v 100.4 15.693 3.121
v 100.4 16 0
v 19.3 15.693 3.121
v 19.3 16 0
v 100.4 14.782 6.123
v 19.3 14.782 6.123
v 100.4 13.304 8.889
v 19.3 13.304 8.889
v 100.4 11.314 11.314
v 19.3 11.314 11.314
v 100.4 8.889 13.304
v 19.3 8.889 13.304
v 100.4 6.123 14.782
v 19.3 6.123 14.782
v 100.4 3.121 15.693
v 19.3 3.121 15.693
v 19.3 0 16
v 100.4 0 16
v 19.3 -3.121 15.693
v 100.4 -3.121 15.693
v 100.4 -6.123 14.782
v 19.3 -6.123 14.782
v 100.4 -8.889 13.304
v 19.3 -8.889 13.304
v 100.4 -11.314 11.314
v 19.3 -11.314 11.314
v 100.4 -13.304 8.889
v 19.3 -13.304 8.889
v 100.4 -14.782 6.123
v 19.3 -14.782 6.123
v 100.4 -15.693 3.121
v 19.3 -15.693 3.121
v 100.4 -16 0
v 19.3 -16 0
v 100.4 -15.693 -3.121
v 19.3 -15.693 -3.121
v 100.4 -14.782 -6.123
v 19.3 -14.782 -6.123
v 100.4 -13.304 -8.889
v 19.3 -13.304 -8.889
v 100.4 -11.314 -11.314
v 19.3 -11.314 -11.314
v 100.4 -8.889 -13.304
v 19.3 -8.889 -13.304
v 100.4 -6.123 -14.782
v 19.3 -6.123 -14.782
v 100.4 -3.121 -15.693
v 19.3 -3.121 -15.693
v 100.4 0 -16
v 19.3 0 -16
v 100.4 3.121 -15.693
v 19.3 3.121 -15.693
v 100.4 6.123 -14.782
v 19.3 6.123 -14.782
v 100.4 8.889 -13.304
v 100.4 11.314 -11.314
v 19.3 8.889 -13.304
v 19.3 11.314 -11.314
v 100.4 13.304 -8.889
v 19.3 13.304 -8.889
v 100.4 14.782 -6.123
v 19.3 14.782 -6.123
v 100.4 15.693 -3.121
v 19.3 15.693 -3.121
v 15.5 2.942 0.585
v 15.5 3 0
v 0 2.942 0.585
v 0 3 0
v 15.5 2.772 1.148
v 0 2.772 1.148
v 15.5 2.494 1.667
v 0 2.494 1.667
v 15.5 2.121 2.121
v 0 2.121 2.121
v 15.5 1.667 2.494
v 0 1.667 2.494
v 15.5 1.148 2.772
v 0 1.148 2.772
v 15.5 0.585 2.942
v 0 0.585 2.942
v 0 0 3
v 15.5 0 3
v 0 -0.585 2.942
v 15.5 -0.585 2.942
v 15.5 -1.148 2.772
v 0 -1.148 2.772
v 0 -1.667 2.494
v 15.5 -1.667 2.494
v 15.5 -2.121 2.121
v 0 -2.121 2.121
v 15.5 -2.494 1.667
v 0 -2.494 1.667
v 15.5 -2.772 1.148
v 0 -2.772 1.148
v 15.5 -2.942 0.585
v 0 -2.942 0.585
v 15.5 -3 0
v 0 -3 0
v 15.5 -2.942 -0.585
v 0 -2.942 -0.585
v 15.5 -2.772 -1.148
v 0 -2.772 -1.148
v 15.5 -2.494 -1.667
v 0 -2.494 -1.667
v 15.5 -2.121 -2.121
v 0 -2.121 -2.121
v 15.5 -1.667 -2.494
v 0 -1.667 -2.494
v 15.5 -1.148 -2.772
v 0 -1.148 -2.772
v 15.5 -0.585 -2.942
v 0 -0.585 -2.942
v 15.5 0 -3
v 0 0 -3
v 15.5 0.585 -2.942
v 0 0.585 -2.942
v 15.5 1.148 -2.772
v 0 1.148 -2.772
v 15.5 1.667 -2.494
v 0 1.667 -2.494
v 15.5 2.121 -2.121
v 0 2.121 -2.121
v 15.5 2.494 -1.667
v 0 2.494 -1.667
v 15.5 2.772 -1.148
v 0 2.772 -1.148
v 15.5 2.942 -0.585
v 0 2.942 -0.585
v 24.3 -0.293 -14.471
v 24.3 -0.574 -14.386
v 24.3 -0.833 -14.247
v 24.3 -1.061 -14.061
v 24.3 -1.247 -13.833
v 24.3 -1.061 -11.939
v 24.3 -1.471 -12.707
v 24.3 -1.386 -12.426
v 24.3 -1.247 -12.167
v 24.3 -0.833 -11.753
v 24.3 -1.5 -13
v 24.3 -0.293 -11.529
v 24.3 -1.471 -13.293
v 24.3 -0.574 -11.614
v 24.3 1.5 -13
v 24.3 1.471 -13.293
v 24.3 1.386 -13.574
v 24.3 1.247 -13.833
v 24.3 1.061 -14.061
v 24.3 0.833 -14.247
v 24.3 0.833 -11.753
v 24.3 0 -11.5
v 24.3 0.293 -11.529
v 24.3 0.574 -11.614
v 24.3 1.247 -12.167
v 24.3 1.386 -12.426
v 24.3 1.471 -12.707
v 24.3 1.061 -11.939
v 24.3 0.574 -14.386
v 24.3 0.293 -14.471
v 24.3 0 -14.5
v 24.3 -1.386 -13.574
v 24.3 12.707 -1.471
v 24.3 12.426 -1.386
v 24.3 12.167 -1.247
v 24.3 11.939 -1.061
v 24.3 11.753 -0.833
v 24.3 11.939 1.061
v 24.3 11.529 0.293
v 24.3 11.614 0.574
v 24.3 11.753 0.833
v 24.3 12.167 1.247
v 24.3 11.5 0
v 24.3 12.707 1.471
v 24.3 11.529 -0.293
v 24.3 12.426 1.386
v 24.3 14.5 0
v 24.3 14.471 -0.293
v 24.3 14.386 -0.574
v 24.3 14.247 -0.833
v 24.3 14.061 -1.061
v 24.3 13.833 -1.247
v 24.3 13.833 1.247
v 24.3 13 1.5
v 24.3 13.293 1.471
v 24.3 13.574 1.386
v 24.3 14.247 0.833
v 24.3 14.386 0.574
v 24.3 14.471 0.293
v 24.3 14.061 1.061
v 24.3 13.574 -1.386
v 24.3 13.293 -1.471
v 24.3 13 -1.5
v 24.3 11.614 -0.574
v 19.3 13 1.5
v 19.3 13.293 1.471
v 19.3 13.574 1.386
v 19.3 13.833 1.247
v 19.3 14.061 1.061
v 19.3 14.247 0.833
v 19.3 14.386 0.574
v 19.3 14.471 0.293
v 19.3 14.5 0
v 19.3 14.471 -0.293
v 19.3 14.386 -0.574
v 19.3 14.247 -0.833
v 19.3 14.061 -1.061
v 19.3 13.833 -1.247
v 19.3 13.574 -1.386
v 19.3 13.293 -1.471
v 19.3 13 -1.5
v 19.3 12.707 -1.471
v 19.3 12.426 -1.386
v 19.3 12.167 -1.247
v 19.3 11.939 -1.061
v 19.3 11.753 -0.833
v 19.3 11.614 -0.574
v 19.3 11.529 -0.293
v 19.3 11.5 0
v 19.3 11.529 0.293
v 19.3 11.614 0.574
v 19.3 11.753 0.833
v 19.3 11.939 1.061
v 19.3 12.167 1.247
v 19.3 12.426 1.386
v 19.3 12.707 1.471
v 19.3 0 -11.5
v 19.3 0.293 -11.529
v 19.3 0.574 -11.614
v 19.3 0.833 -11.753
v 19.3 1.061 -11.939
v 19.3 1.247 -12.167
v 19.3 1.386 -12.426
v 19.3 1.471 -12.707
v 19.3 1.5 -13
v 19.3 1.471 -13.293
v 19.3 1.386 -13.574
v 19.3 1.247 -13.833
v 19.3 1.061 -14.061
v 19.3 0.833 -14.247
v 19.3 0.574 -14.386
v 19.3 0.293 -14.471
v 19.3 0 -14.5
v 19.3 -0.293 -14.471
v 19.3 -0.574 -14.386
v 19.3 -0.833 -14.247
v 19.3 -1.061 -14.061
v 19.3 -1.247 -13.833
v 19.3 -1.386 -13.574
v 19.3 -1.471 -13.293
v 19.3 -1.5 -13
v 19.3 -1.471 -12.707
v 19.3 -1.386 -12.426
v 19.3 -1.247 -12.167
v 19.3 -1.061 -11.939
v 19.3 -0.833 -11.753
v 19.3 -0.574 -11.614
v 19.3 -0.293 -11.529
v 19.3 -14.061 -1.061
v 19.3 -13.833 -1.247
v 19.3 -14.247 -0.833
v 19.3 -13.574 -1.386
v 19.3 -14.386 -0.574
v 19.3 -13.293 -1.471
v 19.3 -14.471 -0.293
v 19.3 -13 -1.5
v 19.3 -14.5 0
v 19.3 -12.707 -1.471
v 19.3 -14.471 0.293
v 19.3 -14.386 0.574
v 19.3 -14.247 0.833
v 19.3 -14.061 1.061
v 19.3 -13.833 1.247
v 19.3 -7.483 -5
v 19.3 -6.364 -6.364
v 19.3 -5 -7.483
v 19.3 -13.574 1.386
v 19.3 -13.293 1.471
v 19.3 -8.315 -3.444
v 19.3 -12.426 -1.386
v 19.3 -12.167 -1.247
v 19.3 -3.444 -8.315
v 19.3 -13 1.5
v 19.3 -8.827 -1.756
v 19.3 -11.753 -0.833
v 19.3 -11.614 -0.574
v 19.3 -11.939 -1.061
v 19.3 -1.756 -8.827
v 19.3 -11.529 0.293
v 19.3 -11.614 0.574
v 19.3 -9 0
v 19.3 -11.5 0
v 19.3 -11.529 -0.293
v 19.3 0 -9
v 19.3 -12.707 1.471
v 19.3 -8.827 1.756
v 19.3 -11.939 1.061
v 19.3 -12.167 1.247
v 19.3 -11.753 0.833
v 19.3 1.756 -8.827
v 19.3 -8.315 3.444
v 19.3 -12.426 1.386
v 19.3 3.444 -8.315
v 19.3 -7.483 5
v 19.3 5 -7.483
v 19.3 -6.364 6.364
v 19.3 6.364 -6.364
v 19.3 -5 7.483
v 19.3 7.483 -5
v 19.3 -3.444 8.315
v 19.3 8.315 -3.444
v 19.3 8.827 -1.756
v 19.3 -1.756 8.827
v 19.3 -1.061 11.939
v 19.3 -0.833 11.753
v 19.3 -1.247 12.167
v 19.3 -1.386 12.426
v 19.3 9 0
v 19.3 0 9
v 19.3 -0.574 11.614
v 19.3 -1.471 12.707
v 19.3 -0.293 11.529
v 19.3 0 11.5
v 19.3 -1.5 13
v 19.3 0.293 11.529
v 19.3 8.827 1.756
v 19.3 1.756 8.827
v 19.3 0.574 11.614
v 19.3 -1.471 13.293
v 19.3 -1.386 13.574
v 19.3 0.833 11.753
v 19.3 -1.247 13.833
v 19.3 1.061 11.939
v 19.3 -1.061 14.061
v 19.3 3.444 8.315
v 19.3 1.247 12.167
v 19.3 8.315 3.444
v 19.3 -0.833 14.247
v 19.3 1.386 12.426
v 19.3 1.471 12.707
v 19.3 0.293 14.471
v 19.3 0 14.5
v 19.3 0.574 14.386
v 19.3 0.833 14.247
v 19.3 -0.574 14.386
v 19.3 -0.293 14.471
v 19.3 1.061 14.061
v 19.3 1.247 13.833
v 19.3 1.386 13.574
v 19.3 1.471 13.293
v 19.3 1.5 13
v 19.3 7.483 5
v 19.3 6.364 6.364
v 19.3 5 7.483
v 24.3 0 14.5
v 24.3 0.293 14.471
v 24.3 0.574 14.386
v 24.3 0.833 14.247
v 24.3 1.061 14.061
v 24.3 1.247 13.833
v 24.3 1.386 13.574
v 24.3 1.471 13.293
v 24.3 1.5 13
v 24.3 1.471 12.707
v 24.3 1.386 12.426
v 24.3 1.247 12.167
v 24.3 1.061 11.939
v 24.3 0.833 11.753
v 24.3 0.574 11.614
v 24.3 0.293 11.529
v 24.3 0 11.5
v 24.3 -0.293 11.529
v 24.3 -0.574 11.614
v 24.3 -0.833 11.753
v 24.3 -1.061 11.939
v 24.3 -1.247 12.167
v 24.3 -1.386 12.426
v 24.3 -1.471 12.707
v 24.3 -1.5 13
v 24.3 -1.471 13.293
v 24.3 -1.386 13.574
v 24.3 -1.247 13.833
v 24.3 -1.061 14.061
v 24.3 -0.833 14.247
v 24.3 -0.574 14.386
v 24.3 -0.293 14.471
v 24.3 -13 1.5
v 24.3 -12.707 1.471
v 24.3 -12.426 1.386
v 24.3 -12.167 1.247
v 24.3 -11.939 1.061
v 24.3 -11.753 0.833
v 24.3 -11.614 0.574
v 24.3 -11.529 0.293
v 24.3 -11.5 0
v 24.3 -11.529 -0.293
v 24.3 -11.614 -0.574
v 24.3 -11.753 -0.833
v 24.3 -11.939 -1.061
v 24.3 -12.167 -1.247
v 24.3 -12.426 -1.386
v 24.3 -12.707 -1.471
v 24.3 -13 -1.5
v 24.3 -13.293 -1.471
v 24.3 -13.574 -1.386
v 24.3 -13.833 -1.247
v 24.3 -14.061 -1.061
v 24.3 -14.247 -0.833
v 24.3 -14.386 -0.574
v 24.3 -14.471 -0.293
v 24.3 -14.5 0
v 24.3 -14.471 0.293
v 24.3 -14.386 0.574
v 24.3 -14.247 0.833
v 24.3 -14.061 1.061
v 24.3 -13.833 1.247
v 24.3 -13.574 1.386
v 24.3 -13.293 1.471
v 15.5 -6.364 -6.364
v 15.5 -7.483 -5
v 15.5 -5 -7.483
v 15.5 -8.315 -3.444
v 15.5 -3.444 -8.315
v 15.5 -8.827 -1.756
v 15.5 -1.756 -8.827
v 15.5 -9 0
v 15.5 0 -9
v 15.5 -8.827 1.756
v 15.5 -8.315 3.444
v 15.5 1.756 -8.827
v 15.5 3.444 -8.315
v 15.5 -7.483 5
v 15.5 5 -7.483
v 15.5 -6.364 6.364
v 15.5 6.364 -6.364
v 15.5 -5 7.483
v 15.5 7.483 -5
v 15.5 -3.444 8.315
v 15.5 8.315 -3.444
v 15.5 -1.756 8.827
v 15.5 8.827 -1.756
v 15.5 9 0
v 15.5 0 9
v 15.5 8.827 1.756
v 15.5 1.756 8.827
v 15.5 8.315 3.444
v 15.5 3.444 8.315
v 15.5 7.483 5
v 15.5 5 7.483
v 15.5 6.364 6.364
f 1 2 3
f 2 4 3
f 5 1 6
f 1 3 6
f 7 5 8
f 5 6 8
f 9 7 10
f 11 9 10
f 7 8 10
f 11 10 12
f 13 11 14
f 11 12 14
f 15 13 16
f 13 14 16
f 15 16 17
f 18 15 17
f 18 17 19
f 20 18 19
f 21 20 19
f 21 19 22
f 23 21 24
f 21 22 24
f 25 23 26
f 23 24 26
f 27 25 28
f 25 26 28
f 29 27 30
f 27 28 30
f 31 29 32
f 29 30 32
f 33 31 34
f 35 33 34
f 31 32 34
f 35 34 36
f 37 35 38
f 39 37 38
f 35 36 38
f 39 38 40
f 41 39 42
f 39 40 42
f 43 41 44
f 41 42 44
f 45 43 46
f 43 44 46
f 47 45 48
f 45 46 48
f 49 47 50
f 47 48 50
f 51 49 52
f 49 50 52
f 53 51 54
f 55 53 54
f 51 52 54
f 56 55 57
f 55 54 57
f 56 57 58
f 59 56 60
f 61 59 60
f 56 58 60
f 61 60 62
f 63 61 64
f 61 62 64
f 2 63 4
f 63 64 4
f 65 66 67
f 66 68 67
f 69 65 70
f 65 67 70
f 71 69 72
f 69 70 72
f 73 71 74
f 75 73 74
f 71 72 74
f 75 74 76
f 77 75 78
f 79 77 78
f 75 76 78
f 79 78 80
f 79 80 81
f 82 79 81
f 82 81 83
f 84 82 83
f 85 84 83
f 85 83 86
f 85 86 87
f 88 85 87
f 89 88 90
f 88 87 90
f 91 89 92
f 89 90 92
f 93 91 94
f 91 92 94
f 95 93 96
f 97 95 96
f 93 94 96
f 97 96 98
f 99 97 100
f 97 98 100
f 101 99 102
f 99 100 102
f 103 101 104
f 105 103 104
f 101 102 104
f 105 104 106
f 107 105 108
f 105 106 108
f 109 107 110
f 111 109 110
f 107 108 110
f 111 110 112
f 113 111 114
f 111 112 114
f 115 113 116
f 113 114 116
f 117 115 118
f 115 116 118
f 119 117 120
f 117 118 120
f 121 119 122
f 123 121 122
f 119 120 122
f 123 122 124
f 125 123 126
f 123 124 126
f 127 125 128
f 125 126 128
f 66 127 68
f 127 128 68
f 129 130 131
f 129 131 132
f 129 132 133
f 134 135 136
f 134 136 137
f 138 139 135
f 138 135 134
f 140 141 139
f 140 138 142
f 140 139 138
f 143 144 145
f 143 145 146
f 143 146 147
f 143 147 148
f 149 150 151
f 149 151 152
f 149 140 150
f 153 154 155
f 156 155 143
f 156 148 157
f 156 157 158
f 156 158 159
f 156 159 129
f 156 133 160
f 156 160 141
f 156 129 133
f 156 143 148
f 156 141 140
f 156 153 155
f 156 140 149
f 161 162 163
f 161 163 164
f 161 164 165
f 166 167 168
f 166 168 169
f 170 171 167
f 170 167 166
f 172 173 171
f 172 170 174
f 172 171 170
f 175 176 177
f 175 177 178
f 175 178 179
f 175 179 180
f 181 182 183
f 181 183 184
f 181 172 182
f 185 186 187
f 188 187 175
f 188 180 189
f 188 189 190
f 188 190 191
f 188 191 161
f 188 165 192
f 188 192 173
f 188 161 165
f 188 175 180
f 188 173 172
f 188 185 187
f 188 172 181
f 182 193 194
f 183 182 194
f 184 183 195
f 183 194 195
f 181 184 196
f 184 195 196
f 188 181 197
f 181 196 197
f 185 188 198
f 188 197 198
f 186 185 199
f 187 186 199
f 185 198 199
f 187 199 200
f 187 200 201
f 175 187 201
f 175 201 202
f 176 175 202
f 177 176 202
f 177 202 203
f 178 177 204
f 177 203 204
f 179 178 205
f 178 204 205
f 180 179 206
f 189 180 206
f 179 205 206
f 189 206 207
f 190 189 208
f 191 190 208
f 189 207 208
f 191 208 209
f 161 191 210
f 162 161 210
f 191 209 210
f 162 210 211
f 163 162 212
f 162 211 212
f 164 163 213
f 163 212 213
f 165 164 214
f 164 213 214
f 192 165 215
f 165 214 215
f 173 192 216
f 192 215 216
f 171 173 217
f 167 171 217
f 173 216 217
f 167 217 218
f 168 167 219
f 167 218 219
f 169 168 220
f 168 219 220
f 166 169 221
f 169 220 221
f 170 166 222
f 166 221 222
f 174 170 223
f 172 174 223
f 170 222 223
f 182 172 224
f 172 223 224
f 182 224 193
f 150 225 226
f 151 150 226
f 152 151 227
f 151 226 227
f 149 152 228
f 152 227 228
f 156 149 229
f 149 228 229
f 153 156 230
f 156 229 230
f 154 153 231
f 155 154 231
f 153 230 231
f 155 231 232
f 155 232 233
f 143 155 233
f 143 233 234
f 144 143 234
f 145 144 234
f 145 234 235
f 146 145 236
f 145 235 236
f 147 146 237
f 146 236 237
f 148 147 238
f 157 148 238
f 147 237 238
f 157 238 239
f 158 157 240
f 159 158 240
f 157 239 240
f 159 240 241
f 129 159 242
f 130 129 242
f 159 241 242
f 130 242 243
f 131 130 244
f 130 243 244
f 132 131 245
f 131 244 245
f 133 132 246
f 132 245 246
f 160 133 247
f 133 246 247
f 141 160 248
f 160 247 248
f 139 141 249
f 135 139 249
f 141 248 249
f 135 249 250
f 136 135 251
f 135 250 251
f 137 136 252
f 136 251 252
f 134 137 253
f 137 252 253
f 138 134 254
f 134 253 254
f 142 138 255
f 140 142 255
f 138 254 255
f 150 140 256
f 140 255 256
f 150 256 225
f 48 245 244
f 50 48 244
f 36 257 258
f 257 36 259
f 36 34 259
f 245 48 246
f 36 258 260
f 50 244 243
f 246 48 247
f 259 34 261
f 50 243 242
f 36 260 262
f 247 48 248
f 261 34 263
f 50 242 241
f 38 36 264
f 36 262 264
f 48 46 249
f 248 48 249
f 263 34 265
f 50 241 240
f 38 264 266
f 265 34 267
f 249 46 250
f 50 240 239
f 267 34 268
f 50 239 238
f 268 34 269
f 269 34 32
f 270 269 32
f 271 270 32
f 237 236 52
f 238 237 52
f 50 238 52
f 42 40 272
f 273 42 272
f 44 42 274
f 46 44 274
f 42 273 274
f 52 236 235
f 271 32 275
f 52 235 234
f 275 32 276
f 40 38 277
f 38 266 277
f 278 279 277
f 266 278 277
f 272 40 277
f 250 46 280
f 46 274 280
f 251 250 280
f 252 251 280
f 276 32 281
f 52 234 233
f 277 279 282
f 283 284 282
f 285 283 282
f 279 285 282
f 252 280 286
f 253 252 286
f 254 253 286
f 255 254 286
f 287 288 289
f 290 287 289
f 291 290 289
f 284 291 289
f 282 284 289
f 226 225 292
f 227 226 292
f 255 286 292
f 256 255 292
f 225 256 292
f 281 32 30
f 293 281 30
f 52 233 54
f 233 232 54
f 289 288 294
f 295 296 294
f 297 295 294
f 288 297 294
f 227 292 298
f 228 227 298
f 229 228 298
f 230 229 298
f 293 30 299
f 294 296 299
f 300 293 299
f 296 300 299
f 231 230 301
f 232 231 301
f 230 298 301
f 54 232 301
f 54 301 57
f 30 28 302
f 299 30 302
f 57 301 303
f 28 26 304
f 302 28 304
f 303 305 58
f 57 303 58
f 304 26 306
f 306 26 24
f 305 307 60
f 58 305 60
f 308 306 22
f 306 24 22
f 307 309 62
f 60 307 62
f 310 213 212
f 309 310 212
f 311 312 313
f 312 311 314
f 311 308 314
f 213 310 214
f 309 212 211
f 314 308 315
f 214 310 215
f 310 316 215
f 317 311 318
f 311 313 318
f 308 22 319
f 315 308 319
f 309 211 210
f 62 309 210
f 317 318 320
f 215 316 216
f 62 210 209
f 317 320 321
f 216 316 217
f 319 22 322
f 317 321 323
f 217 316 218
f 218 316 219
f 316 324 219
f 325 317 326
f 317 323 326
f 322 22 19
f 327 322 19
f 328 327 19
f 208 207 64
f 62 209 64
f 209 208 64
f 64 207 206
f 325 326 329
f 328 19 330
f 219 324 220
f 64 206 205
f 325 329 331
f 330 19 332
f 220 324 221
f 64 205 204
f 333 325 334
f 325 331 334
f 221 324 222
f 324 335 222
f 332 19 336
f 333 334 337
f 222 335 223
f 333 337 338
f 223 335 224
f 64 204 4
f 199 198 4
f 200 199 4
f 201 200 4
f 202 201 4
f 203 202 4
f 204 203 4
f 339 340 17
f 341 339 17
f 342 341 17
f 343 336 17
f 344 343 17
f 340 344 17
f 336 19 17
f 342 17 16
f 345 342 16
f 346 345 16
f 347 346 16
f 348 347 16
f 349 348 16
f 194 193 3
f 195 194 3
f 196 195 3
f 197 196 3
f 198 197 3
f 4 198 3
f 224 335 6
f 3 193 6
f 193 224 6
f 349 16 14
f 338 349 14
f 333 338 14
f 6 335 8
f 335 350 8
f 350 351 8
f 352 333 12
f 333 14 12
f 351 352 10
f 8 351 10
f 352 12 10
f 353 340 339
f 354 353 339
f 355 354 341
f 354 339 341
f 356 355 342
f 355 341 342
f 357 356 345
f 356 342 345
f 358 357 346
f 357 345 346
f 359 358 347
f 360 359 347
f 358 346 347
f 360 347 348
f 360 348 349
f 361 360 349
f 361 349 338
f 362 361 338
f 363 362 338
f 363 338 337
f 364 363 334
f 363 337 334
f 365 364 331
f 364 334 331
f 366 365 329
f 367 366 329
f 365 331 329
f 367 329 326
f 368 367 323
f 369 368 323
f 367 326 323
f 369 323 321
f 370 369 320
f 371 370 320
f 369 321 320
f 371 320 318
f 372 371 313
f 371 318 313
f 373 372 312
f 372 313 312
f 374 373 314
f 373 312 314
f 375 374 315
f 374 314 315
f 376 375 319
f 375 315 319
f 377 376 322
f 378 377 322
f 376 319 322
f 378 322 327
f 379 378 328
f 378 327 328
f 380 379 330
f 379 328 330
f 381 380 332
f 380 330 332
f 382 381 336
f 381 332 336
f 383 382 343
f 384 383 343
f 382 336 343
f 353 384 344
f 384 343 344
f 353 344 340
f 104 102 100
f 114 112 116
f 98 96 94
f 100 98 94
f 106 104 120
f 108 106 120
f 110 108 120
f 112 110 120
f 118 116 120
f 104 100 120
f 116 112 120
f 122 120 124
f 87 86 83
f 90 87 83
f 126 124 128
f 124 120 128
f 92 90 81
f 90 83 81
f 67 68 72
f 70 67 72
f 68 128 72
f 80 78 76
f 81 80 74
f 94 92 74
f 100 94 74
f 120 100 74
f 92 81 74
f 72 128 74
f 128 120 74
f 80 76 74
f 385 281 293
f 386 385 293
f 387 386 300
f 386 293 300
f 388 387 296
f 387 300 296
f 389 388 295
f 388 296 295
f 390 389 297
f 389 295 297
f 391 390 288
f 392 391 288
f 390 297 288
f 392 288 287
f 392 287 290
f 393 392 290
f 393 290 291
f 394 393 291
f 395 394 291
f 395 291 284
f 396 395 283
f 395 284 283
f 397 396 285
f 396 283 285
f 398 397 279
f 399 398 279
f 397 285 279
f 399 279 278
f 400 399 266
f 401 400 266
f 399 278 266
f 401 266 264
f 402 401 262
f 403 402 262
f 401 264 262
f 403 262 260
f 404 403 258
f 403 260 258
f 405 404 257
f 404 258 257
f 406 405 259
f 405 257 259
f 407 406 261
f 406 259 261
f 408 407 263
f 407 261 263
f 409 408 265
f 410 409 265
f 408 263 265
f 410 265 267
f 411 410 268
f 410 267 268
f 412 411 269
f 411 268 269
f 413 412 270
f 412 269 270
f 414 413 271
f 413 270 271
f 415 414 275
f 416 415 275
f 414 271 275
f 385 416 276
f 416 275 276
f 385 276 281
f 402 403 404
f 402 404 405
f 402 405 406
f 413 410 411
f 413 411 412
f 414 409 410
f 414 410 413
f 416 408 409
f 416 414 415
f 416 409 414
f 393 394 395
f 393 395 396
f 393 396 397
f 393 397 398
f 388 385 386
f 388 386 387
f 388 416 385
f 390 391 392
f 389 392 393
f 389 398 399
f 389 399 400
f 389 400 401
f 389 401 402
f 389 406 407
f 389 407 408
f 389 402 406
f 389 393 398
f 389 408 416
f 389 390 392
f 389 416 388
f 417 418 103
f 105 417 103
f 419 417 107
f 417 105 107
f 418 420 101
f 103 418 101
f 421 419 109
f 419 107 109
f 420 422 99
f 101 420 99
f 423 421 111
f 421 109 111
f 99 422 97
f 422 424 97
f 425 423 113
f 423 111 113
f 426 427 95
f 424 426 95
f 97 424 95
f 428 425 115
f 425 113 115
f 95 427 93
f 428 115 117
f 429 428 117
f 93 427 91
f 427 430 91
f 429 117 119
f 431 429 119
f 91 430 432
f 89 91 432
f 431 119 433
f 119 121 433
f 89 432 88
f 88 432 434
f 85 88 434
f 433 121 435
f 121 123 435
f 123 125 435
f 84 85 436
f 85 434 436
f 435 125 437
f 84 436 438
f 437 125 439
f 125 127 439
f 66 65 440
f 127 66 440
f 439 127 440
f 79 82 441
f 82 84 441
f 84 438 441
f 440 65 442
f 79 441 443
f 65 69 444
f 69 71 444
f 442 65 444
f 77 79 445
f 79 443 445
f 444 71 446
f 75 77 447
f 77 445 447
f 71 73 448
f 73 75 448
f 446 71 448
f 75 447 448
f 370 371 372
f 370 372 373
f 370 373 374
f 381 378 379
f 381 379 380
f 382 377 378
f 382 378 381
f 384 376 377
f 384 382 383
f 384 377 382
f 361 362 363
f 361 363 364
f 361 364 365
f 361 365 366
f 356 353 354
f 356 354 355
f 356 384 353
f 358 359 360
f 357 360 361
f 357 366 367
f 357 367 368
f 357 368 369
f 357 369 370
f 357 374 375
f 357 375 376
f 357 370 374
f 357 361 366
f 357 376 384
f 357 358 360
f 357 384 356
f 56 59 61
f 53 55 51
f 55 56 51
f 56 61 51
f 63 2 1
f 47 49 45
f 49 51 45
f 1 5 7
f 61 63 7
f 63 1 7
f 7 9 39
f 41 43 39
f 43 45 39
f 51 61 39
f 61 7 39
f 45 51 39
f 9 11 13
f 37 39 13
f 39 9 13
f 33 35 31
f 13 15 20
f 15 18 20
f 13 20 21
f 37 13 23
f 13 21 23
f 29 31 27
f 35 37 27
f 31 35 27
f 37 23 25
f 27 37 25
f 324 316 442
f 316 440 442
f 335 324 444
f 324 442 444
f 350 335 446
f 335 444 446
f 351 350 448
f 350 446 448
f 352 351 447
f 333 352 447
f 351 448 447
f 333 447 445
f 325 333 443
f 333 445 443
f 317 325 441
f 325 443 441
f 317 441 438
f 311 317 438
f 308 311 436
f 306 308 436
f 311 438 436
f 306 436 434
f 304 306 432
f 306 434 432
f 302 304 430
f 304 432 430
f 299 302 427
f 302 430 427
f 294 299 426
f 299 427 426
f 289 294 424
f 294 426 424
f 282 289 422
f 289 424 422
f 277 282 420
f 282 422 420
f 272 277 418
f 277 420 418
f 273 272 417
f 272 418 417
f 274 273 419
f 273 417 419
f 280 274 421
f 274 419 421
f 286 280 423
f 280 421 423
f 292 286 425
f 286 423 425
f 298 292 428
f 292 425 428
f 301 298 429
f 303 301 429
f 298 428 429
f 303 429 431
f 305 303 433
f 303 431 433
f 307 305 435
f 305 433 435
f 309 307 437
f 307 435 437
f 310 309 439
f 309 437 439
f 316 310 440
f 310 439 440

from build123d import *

# Parameters (mm, degrees)
SKETCH2_R          = 1.5
CUT_EXTRUDE1_DEPTH = 5


with BuildPart() as part:
    # Sketch1 → Revolve1 (revolve)
    with BuildSketch(Plane.XY):
        Polygon((0, 0), (100.4, 0), (100.4, 16), (19.3, 16), (19.3, 9), (15.5, 9), (15.5, 3), (0, 3), align=None)
    revolve(axis=Axis((0, 0, 0), (1, 0, 0)))

    # Sketch2 → Cut-Extrude1 (cut)
    with BuildSketch(Plane.ZY.offset(-19.3)):
        with Locations((0, 13)):
            Circle(SKETCH2_R)
        with Locations((0, -13)):
            Circle(SKETCH2_R)
        with Locations((-13, 0)):
            Circle(SKETCH2_R)
        with Locations((13, 0)):
            Circle(SKETCH2_R)
    extrude(amount=-CUT_EXTRUDE1_DEPTH, mode=Mode.SUBTRACT)


solid = part.part
